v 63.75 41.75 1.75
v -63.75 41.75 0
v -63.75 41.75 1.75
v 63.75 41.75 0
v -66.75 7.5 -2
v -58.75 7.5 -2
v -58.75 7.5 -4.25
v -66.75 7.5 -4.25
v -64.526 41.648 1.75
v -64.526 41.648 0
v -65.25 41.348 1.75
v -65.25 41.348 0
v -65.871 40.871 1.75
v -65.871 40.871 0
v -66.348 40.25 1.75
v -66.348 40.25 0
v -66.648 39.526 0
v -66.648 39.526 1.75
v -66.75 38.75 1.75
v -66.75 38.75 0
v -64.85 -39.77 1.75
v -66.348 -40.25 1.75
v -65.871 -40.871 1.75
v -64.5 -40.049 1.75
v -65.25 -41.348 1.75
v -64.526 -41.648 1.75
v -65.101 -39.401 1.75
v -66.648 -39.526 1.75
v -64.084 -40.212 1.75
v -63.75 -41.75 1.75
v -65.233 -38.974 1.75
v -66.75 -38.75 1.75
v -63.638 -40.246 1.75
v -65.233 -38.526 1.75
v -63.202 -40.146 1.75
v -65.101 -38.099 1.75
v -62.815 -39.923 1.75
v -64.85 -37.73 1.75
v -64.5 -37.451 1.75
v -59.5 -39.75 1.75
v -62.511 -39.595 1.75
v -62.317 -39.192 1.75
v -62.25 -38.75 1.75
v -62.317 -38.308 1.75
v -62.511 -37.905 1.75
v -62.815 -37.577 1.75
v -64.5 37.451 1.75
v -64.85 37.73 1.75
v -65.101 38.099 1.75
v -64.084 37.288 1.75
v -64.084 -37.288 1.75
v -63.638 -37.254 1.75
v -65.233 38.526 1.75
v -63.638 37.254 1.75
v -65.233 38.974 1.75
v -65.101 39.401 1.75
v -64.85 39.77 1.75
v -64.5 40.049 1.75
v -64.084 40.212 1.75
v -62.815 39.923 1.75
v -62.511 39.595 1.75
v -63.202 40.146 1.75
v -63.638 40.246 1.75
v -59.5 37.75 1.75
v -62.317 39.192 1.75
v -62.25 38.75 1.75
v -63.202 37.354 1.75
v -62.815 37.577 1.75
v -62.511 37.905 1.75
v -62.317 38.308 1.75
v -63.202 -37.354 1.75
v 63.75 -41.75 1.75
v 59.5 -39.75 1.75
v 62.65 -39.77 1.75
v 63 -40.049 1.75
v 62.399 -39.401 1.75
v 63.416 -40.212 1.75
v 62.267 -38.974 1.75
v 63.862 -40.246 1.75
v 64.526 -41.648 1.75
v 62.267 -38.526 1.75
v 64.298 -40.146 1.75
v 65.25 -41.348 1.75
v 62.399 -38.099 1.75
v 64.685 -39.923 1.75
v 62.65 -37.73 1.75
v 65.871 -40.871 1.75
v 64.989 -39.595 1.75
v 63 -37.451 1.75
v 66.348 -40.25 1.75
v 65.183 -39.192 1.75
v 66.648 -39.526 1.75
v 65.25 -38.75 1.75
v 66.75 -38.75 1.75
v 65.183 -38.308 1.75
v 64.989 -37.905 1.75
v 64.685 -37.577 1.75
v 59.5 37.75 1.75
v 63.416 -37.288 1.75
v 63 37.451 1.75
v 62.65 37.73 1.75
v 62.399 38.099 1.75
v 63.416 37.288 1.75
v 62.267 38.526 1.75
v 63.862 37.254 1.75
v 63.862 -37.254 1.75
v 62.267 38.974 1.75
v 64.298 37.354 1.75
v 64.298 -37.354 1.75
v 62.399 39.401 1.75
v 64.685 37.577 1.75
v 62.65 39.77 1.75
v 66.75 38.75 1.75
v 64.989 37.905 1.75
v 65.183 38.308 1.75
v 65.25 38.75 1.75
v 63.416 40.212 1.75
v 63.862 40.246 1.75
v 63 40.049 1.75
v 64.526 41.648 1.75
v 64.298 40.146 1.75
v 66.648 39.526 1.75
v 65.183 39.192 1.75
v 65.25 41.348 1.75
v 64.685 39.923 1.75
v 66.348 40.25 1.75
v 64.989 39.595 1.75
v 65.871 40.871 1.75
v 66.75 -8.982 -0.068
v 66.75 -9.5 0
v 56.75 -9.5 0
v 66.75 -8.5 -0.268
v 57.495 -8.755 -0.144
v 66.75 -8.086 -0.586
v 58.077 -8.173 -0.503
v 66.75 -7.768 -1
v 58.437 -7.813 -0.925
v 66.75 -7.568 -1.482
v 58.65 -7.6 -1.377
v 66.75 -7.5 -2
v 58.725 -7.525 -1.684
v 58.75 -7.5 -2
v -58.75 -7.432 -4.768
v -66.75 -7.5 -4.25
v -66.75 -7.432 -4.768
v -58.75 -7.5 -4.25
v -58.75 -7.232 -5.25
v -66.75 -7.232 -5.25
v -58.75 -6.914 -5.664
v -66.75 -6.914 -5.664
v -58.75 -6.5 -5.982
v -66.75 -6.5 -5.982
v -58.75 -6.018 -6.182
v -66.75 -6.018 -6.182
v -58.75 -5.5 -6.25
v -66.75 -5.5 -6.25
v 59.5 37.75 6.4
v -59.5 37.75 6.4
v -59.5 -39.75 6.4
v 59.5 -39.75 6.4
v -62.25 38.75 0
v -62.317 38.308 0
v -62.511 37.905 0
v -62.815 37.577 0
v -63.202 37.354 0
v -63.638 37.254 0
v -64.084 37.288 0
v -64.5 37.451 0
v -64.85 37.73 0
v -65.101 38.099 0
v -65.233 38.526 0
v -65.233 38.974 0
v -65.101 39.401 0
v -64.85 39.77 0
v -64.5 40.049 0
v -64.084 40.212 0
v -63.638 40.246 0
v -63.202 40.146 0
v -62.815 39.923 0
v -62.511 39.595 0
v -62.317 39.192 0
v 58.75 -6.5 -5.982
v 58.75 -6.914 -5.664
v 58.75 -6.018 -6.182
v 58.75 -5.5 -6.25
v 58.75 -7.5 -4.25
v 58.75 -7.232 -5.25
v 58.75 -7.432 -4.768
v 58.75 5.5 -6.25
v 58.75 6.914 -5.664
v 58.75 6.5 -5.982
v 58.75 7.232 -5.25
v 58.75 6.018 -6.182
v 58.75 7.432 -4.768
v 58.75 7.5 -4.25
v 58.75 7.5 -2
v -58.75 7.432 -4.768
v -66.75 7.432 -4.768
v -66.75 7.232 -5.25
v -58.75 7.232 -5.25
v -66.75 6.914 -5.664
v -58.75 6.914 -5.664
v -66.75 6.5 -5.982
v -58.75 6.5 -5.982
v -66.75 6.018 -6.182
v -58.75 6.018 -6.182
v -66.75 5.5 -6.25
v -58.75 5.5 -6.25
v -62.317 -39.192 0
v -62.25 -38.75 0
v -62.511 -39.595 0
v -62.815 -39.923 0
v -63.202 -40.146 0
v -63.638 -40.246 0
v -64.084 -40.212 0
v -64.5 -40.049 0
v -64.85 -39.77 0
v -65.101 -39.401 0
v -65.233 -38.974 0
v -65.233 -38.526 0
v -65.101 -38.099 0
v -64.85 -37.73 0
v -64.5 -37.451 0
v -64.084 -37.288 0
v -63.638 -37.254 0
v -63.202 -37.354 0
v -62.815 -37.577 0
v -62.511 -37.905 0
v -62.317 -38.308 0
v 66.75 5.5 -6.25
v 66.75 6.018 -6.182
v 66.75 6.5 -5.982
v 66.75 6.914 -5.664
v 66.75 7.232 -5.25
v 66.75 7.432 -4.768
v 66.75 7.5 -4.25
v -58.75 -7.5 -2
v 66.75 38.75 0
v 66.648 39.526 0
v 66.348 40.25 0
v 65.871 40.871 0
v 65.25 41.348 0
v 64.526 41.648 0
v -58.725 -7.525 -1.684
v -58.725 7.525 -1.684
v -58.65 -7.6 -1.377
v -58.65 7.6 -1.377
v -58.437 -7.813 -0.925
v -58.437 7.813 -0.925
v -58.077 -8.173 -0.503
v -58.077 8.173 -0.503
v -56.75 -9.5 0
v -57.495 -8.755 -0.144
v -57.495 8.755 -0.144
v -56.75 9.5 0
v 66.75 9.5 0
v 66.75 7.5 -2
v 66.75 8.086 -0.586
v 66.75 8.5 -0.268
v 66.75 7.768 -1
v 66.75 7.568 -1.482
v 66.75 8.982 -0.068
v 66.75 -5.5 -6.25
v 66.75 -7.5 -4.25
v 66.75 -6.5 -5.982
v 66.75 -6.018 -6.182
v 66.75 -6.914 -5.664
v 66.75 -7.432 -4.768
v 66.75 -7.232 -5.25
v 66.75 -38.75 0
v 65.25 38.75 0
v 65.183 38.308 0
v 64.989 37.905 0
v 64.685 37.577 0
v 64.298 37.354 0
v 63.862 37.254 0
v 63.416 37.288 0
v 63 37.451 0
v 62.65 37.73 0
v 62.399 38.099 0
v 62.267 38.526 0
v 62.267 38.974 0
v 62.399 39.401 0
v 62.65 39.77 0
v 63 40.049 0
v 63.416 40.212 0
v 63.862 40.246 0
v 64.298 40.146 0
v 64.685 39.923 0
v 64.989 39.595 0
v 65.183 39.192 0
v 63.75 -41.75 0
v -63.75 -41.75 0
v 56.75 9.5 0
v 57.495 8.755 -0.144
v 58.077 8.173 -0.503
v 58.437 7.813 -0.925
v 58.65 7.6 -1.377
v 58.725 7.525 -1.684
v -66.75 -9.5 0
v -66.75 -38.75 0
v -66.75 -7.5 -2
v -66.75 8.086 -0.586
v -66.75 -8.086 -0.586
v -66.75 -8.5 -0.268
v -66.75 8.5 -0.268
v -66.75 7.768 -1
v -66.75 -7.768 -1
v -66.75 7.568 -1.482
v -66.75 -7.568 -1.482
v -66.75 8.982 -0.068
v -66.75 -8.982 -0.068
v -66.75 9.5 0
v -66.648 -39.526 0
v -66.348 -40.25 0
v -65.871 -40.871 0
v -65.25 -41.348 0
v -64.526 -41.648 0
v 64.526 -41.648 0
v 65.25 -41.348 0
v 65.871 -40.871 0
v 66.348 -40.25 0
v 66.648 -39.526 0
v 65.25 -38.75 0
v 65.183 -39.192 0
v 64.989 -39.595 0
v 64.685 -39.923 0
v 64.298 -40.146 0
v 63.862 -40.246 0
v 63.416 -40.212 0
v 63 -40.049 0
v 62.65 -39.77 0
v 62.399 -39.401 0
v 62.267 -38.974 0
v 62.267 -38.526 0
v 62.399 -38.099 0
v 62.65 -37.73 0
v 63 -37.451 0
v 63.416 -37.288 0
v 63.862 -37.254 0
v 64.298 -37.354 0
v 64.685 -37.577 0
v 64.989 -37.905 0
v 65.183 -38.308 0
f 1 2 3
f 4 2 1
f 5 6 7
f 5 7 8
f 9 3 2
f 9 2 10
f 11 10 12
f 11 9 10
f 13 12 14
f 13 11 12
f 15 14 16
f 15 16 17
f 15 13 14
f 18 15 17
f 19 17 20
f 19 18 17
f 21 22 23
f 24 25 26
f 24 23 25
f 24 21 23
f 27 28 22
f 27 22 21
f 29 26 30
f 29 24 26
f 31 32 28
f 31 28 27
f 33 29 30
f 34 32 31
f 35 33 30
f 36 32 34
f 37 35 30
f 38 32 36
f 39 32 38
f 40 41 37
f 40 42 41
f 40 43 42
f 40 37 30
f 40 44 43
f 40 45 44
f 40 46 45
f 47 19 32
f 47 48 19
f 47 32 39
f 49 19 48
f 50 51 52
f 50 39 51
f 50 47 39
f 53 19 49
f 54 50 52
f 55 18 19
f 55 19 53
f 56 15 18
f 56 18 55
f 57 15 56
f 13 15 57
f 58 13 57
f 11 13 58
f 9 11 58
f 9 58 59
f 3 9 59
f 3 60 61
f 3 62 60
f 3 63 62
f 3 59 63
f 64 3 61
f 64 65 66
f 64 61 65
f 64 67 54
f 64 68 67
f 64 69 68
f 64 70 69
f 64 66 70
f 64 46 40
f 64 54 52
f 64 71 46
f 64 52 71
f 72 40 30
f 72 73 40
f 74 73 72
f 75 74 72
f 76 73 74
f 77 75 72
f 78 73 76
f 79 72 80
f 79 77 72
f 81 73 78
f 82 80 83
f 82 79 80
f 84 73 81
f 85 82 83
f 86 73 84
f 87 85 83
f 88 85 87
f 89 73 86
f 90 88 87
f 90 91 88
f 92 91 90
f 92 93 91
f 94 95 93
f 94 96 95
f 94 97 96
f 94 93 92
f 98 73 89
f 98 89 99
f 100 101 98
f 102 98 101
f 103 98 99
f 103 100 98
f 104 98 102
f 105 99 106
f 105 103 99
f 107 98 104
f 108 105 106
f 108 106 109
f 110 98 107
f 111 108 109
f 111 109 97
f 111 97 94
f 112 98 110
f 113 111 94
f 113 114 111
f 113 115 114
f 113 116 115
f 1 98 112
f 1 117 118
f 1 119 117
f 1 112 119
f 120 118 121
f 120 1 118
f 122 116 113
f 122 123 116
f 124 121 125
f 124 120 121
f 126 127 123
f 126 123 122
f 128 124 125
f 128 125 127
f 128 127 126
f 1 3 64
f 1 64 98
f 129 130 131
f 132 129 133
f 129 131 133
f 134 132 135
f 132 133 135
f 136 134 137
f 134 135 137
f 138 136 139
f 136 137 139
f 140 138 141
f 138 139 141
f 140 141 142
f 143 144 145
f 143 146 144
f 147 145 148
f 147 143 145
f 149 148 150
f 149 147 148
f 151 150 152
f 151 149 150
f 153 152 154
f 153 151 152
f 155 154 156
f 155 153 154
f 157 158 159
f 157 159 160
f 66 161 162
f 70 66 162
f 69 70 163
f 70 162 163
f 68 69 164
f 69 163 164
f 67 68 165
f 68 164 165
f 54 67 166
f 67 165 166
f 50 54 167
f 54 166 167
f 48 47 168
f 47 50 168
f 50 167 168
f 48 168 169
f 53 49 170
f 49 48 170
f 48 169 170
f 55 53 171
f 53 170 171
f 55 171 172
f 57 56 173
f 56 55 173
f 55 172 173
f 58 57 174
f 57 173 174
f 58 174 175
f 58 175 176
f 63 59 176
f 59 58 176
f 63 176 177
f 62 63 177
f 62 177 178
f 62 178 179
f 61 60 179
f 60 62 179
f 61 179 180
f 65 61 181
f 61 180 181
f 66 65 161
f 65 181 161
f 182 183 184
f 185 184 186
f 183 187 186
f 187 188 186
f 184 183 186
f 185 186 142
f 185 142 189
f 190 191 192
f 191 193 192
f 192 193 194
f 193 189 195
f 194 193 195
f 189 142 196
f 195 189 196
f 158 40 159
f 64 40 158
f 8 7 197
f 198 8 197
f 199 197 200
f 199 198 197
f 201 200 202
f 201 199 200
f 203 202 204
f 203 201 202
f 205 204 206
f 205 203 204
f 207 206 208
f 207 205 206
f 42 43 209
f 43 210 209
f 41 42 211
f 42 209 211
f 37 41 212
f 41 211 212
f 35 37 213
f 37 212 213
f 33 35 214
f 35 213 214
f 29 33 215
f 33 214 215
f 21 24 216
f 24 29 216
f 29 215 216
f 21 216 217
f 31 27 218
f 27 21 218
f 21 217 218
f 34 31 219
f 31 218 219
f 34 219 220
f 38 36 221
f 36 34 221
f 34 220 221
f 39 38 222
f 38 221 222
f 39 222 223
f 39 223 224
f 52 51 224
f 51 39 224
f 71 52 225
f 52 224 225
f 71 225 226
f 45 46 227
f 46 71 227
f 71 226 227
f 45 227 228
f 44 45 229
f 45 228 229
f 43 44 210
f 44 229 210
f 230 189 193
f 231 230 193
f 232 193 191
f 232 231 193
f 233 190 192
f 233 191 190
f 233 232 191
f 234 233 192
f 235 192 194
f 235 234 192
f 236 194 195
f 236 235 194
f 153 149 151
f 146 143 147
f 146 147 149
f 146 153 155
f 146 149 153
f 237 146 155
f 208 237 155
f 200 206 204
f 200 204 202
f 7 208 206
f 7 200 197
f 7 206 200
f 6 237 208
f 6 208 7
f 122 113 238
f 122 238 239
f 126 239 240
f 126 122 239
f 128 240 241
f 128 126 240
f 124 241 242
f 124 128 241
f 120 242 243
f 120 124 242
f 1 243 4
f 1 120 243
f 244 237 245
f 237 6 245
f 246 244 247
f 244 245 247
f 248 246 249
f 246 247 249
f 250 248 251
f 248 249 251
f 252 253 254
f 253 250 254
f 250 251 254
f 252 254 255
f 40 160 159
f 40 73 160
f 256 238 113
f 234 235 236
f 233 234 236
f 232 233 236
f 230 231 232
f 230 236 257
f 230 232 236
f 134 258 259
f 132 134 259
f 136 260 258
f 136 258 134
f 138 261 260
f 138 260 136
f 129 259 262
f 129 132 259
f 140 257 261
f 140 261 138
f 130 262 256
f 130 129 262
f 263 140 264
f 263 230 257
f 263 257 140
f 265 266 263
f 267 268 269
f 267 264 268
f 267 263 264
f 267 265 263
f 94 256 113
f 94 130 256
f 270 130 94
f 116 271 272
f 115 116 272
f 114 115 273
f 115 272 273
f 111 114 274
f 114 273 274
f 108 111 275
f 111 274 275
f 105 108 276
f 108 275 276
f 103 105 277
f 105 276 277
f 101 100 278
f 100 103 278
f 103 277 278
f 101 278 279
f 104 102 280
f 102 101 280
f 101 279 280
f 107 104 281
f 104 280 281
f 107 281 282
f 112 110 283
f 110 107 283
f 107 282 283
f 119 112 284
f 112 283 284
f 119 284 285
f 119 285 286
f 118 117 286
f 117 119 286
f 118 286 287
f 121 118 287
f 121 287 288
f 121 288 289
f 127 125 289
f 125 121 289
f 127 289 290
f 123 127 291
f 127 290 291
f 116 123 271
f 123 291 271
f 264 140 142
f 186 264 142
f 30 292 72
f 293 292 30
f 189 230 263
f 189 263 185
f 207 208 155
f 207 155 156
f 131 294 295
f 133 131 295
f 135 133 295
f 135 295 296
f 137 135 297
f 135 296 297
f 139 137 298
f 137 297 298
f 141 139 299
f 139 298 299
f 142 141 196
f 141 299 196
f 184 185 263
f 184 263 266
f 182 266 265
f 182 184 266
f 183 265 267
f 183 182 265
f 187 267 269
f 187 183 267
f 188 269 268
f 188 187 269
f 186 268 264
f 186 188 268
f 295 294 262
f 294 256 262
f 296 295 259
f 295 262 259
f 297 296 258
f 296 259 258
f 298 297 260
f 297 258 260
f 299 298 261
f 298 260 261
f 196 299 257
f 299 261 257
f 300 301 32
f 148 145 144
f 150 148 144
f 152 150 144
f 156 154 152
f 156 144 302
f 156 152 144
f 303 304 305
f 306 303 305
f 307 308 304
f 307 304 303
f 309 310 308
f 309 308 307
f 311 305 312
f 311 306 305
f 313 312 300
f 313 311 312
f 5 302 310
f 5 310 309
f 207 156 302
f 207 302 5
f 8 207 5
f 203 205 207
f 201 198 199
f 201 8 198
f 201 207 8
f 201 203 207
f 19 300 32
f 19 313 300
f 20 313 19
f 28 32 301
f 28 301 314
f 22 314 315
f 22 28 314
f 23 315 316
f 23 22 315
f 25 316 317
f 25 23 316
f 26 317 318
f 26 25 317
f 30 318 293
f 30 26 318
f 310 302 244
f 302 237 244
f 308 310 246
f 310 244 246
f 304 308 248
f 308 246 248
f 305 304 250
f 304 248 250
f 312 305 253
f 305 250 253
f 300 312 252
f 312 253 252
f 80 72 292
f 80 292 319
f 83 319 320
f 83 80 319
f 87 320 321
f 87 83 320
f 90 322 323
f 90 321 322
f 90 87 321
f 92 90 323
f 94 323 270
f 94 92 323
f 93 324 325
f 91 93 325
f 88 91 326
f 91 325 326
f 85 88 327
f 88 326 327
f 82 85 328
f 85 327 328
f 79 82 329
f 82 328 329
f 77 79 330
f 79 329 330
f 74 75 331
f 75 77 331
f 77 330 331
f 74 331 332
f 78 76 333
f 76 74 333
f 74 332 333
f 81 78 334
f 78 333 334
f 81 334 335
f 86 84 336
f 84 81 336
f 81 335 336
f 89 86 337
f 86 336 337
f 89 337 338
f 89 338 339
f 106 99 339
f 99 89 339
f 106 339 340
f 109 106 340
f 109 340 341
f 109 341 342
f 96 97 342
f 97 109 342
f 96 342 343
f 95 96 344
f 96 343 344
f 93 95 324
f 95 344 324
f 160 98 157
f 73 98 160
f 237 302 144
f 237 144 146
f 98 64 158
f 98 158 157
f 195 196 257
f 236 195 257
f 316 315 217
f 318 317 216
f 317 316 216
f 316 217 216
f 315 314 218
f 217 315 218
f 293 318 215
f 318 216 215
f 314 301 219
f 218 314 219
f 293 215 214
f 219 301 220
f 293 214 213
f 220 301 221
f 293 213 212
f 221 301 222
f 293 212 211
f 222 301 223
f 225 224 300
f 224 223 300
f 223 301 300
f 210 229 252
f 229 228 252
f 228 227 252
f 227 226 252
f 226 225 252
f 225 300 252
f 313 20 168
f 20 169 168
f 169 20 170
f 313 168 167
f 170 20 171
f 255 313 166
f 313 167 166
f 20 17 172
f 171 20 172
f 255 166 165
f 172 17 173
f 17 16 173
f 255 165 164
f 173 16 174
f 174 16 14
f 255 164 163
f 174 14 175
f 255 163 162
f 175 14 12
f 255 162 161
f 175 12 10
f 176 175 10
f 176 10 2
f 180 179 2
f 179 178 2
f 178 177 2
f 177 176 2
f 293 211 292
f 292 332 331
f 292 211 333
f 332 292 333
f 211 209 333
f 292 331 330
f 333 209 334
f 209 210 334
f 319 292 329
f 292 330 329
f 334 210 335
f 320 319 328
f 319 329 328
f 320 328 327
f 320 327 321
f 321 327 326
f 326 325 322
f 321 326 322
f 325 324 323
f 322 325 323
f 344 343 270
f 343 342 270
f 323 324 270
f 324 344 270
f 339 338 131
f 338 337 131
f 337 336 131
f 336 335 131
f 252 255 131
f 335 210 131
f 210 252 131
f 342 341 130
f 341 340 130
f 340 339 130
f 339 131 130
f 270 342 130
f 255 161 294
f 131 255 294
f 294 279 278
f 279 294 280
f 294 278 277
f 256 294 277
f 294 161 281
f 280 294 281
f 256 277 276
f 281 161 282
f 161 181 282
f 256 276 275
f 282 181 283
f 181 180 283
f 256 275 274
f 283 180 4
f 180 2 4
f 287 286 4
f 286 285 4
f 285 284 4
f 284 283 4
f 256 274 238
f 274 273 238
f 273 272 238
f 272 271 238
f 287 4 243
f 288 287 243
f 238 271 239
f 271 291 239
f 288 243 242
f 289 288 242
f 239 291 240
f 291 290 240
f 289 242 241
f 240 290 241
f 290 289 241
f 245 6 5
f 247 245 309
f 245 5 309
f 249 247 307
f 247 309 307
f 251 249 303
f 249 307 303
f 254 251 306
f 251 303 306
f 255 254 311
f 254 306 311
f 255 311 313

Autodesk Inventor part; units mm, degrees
ref_plane "YZ Plane" through (0, 0, 0) normal (1, 0, 0) x (0, 1, 0)
ref_plane "XZ Plane" through (0, 0, 0) normal (0, 1, 0) x (-1, 0, 0)
ref_plane "XY Plane" through (0, 0, 0) normal (0, 0, 1) x (1, 0, 0)
sketch "Sketch1" plane through (0, 0, 0) normal (0, 0, 1) x (1, 0, 0)
  line L0 (-66.75, 41.75) -> (66.75, 41.75)
  line L1 (66.75, 41.75) -> (66.75, -41.75)
  line L2 (66.75, -41.75) -> (-66.75, -41.75)
  line L3 (-66.75, -41.75) -> (-66.75, 41.75)
  line L4 (-66.75, 41.75) -> (66.75, -41.75) construction
  line L5 (66.75, 41.75) -> (-66.75, -41.75) construction
  circle A0 centre (-63.75, 38.75) radius 1.5
  circle A1 centre (63.75, 38.75) radius 1.5
  circle A2 centre (63.75, -38.75) radius 1.5
  circle A3 centre (-63.75, -38.75) radius 1.5
  point P0 (0, 0)
  dimension "d0" = 133.5
  dimension "d1" = 83.5
  dimension "d2" = 3
  dimension "d3" = 3
  dimension "d4" = 3
  dimension "d5" = 3
  dimension "d6" = 3
  dimension "d7" = 3
  dimension "d8" = 3
  dimension "d9" = 3
  dimension "d10" = 3
  dimension "d11" = 3
  dimension "d12" = 3
  dimension "d13" = 3
extrude "Extrusion1" add sketch "Sketch1" along normal blind 1.75
fillet "Fillet1" radius 3 4 edges at (66.75, 41.75, 0.875) (-66.75, 41.75, 0.875) (66.75, -41.75, 0.875) (-66.75, -41.75, 0.875)
sketch "Sketch2" plane through (0, 0, 1.75) normal (0, 0, 1) x (1, 0, 0)
  line L0 (-59.5, 37.75) -> (59.5, 37.75)
  line L1 (59.5, 37.75) -> (59.5, -39.75)
  line L2 (59.5, -39.75) -> (-59.5, -39.75)
  line L3 (-59.5, -39.75) -> (-59.5, 37.75)
  line L4 (-59.5, 37.75) -> (59.5, -39.75) construction
  line L5 (59.5, 37.75) -> (-59.5, -39.75) construction
  line L6 (63.75, 41.75) -> (-63.75, 41.75) projected
  point P0 (0, 0)
  point P1 (0, -1)
  dimension "d17" = 0
  dimension "d19" = 77.5
  dimension "d20" = 4
  dimension "d21" = 119
extrude "Extrusion2" add sketch "Sketch2" along normal blind 4.65
sketch "Sketch3" plane through (0, 0, 0) normal (0, 0, -1) x (-1, 0, 0)
  line L0 (66.75, -7.5) -> (58.75, -7.5)
  line L1 (58.75, -7.5) -> (58.75, 7.5)
  line L2 (58.75, 7.5) -> (66.75, 7.5)
  line L3 (66.75, 7.5) -> (66.75, -7.5)
  line L4 (66.75, -7.5) -> (58.75, 7.5) construction
  line L5 (58.75, -7.5) -> (66.75, 7.5) construction
  line L6 (-66.75, -7.5) -> (-58.75, -7.5)
  line L7 (-58.75, -7.5) -> (-58.75, 7.5)
  line L8 (-58.75, 7.5) -> (-66.75, 7.5)
  line L9 (-66.75, 7.5) -> (-66.75, -7.5)
  line L10 (-66.75, -7.5) -> (-58.75, 7.5) construction
  line L11 (-58.75, -7.5) -> (-66.75, 7.5) construction
  line L12 (-66.75, -38.75) -> (-66.75, 38.75) projected
  line L13 (66.75, 38.75) -> (66.75, -38.75) projected
  point P0 (0, 0)
  point P1 (62.75, 0)
  point P2 (-62.75, 0)
  dimension "d24" = 8
  dimension "d25" = 15
  dimension "d26" = 8
  dimension "d27" = 15
  dimension "d28" = 0
  dimension "d29" = 0
  dimension "d30" = 0
  dimension "d31" = 0
extrude "Extrusion3" add sketch "Sketch3" along normal blind 6.25
fillet "Fillet2" radius 2 6 edges at (-62.75, 7.5, 0) (-58.75, 0, 0) (-62.75, -7.5, 0) (62.75, 7.5, 0) (58.75, 0, 0) (62.75, -7.5, 0)
fillet "Fillet3" radius 2 4 edges at (62.75, 7.5, -6.25) (62.75, -7.5, -6.25) (-62.75, 7.5, -6.25) (-62.75, -7.5, -6.25)
equation "\"d8\" = d6"
equation "\"d9\" = d7"
equation "\"d10\" = d7"
equation "\"d11\" = d6"
equation "\"d12\" = d6"
equation "\"d13\" = d6"
equation "\"d26\" = d24"
equation "\"d27\" = d25"
properties part number "Tela Led"
